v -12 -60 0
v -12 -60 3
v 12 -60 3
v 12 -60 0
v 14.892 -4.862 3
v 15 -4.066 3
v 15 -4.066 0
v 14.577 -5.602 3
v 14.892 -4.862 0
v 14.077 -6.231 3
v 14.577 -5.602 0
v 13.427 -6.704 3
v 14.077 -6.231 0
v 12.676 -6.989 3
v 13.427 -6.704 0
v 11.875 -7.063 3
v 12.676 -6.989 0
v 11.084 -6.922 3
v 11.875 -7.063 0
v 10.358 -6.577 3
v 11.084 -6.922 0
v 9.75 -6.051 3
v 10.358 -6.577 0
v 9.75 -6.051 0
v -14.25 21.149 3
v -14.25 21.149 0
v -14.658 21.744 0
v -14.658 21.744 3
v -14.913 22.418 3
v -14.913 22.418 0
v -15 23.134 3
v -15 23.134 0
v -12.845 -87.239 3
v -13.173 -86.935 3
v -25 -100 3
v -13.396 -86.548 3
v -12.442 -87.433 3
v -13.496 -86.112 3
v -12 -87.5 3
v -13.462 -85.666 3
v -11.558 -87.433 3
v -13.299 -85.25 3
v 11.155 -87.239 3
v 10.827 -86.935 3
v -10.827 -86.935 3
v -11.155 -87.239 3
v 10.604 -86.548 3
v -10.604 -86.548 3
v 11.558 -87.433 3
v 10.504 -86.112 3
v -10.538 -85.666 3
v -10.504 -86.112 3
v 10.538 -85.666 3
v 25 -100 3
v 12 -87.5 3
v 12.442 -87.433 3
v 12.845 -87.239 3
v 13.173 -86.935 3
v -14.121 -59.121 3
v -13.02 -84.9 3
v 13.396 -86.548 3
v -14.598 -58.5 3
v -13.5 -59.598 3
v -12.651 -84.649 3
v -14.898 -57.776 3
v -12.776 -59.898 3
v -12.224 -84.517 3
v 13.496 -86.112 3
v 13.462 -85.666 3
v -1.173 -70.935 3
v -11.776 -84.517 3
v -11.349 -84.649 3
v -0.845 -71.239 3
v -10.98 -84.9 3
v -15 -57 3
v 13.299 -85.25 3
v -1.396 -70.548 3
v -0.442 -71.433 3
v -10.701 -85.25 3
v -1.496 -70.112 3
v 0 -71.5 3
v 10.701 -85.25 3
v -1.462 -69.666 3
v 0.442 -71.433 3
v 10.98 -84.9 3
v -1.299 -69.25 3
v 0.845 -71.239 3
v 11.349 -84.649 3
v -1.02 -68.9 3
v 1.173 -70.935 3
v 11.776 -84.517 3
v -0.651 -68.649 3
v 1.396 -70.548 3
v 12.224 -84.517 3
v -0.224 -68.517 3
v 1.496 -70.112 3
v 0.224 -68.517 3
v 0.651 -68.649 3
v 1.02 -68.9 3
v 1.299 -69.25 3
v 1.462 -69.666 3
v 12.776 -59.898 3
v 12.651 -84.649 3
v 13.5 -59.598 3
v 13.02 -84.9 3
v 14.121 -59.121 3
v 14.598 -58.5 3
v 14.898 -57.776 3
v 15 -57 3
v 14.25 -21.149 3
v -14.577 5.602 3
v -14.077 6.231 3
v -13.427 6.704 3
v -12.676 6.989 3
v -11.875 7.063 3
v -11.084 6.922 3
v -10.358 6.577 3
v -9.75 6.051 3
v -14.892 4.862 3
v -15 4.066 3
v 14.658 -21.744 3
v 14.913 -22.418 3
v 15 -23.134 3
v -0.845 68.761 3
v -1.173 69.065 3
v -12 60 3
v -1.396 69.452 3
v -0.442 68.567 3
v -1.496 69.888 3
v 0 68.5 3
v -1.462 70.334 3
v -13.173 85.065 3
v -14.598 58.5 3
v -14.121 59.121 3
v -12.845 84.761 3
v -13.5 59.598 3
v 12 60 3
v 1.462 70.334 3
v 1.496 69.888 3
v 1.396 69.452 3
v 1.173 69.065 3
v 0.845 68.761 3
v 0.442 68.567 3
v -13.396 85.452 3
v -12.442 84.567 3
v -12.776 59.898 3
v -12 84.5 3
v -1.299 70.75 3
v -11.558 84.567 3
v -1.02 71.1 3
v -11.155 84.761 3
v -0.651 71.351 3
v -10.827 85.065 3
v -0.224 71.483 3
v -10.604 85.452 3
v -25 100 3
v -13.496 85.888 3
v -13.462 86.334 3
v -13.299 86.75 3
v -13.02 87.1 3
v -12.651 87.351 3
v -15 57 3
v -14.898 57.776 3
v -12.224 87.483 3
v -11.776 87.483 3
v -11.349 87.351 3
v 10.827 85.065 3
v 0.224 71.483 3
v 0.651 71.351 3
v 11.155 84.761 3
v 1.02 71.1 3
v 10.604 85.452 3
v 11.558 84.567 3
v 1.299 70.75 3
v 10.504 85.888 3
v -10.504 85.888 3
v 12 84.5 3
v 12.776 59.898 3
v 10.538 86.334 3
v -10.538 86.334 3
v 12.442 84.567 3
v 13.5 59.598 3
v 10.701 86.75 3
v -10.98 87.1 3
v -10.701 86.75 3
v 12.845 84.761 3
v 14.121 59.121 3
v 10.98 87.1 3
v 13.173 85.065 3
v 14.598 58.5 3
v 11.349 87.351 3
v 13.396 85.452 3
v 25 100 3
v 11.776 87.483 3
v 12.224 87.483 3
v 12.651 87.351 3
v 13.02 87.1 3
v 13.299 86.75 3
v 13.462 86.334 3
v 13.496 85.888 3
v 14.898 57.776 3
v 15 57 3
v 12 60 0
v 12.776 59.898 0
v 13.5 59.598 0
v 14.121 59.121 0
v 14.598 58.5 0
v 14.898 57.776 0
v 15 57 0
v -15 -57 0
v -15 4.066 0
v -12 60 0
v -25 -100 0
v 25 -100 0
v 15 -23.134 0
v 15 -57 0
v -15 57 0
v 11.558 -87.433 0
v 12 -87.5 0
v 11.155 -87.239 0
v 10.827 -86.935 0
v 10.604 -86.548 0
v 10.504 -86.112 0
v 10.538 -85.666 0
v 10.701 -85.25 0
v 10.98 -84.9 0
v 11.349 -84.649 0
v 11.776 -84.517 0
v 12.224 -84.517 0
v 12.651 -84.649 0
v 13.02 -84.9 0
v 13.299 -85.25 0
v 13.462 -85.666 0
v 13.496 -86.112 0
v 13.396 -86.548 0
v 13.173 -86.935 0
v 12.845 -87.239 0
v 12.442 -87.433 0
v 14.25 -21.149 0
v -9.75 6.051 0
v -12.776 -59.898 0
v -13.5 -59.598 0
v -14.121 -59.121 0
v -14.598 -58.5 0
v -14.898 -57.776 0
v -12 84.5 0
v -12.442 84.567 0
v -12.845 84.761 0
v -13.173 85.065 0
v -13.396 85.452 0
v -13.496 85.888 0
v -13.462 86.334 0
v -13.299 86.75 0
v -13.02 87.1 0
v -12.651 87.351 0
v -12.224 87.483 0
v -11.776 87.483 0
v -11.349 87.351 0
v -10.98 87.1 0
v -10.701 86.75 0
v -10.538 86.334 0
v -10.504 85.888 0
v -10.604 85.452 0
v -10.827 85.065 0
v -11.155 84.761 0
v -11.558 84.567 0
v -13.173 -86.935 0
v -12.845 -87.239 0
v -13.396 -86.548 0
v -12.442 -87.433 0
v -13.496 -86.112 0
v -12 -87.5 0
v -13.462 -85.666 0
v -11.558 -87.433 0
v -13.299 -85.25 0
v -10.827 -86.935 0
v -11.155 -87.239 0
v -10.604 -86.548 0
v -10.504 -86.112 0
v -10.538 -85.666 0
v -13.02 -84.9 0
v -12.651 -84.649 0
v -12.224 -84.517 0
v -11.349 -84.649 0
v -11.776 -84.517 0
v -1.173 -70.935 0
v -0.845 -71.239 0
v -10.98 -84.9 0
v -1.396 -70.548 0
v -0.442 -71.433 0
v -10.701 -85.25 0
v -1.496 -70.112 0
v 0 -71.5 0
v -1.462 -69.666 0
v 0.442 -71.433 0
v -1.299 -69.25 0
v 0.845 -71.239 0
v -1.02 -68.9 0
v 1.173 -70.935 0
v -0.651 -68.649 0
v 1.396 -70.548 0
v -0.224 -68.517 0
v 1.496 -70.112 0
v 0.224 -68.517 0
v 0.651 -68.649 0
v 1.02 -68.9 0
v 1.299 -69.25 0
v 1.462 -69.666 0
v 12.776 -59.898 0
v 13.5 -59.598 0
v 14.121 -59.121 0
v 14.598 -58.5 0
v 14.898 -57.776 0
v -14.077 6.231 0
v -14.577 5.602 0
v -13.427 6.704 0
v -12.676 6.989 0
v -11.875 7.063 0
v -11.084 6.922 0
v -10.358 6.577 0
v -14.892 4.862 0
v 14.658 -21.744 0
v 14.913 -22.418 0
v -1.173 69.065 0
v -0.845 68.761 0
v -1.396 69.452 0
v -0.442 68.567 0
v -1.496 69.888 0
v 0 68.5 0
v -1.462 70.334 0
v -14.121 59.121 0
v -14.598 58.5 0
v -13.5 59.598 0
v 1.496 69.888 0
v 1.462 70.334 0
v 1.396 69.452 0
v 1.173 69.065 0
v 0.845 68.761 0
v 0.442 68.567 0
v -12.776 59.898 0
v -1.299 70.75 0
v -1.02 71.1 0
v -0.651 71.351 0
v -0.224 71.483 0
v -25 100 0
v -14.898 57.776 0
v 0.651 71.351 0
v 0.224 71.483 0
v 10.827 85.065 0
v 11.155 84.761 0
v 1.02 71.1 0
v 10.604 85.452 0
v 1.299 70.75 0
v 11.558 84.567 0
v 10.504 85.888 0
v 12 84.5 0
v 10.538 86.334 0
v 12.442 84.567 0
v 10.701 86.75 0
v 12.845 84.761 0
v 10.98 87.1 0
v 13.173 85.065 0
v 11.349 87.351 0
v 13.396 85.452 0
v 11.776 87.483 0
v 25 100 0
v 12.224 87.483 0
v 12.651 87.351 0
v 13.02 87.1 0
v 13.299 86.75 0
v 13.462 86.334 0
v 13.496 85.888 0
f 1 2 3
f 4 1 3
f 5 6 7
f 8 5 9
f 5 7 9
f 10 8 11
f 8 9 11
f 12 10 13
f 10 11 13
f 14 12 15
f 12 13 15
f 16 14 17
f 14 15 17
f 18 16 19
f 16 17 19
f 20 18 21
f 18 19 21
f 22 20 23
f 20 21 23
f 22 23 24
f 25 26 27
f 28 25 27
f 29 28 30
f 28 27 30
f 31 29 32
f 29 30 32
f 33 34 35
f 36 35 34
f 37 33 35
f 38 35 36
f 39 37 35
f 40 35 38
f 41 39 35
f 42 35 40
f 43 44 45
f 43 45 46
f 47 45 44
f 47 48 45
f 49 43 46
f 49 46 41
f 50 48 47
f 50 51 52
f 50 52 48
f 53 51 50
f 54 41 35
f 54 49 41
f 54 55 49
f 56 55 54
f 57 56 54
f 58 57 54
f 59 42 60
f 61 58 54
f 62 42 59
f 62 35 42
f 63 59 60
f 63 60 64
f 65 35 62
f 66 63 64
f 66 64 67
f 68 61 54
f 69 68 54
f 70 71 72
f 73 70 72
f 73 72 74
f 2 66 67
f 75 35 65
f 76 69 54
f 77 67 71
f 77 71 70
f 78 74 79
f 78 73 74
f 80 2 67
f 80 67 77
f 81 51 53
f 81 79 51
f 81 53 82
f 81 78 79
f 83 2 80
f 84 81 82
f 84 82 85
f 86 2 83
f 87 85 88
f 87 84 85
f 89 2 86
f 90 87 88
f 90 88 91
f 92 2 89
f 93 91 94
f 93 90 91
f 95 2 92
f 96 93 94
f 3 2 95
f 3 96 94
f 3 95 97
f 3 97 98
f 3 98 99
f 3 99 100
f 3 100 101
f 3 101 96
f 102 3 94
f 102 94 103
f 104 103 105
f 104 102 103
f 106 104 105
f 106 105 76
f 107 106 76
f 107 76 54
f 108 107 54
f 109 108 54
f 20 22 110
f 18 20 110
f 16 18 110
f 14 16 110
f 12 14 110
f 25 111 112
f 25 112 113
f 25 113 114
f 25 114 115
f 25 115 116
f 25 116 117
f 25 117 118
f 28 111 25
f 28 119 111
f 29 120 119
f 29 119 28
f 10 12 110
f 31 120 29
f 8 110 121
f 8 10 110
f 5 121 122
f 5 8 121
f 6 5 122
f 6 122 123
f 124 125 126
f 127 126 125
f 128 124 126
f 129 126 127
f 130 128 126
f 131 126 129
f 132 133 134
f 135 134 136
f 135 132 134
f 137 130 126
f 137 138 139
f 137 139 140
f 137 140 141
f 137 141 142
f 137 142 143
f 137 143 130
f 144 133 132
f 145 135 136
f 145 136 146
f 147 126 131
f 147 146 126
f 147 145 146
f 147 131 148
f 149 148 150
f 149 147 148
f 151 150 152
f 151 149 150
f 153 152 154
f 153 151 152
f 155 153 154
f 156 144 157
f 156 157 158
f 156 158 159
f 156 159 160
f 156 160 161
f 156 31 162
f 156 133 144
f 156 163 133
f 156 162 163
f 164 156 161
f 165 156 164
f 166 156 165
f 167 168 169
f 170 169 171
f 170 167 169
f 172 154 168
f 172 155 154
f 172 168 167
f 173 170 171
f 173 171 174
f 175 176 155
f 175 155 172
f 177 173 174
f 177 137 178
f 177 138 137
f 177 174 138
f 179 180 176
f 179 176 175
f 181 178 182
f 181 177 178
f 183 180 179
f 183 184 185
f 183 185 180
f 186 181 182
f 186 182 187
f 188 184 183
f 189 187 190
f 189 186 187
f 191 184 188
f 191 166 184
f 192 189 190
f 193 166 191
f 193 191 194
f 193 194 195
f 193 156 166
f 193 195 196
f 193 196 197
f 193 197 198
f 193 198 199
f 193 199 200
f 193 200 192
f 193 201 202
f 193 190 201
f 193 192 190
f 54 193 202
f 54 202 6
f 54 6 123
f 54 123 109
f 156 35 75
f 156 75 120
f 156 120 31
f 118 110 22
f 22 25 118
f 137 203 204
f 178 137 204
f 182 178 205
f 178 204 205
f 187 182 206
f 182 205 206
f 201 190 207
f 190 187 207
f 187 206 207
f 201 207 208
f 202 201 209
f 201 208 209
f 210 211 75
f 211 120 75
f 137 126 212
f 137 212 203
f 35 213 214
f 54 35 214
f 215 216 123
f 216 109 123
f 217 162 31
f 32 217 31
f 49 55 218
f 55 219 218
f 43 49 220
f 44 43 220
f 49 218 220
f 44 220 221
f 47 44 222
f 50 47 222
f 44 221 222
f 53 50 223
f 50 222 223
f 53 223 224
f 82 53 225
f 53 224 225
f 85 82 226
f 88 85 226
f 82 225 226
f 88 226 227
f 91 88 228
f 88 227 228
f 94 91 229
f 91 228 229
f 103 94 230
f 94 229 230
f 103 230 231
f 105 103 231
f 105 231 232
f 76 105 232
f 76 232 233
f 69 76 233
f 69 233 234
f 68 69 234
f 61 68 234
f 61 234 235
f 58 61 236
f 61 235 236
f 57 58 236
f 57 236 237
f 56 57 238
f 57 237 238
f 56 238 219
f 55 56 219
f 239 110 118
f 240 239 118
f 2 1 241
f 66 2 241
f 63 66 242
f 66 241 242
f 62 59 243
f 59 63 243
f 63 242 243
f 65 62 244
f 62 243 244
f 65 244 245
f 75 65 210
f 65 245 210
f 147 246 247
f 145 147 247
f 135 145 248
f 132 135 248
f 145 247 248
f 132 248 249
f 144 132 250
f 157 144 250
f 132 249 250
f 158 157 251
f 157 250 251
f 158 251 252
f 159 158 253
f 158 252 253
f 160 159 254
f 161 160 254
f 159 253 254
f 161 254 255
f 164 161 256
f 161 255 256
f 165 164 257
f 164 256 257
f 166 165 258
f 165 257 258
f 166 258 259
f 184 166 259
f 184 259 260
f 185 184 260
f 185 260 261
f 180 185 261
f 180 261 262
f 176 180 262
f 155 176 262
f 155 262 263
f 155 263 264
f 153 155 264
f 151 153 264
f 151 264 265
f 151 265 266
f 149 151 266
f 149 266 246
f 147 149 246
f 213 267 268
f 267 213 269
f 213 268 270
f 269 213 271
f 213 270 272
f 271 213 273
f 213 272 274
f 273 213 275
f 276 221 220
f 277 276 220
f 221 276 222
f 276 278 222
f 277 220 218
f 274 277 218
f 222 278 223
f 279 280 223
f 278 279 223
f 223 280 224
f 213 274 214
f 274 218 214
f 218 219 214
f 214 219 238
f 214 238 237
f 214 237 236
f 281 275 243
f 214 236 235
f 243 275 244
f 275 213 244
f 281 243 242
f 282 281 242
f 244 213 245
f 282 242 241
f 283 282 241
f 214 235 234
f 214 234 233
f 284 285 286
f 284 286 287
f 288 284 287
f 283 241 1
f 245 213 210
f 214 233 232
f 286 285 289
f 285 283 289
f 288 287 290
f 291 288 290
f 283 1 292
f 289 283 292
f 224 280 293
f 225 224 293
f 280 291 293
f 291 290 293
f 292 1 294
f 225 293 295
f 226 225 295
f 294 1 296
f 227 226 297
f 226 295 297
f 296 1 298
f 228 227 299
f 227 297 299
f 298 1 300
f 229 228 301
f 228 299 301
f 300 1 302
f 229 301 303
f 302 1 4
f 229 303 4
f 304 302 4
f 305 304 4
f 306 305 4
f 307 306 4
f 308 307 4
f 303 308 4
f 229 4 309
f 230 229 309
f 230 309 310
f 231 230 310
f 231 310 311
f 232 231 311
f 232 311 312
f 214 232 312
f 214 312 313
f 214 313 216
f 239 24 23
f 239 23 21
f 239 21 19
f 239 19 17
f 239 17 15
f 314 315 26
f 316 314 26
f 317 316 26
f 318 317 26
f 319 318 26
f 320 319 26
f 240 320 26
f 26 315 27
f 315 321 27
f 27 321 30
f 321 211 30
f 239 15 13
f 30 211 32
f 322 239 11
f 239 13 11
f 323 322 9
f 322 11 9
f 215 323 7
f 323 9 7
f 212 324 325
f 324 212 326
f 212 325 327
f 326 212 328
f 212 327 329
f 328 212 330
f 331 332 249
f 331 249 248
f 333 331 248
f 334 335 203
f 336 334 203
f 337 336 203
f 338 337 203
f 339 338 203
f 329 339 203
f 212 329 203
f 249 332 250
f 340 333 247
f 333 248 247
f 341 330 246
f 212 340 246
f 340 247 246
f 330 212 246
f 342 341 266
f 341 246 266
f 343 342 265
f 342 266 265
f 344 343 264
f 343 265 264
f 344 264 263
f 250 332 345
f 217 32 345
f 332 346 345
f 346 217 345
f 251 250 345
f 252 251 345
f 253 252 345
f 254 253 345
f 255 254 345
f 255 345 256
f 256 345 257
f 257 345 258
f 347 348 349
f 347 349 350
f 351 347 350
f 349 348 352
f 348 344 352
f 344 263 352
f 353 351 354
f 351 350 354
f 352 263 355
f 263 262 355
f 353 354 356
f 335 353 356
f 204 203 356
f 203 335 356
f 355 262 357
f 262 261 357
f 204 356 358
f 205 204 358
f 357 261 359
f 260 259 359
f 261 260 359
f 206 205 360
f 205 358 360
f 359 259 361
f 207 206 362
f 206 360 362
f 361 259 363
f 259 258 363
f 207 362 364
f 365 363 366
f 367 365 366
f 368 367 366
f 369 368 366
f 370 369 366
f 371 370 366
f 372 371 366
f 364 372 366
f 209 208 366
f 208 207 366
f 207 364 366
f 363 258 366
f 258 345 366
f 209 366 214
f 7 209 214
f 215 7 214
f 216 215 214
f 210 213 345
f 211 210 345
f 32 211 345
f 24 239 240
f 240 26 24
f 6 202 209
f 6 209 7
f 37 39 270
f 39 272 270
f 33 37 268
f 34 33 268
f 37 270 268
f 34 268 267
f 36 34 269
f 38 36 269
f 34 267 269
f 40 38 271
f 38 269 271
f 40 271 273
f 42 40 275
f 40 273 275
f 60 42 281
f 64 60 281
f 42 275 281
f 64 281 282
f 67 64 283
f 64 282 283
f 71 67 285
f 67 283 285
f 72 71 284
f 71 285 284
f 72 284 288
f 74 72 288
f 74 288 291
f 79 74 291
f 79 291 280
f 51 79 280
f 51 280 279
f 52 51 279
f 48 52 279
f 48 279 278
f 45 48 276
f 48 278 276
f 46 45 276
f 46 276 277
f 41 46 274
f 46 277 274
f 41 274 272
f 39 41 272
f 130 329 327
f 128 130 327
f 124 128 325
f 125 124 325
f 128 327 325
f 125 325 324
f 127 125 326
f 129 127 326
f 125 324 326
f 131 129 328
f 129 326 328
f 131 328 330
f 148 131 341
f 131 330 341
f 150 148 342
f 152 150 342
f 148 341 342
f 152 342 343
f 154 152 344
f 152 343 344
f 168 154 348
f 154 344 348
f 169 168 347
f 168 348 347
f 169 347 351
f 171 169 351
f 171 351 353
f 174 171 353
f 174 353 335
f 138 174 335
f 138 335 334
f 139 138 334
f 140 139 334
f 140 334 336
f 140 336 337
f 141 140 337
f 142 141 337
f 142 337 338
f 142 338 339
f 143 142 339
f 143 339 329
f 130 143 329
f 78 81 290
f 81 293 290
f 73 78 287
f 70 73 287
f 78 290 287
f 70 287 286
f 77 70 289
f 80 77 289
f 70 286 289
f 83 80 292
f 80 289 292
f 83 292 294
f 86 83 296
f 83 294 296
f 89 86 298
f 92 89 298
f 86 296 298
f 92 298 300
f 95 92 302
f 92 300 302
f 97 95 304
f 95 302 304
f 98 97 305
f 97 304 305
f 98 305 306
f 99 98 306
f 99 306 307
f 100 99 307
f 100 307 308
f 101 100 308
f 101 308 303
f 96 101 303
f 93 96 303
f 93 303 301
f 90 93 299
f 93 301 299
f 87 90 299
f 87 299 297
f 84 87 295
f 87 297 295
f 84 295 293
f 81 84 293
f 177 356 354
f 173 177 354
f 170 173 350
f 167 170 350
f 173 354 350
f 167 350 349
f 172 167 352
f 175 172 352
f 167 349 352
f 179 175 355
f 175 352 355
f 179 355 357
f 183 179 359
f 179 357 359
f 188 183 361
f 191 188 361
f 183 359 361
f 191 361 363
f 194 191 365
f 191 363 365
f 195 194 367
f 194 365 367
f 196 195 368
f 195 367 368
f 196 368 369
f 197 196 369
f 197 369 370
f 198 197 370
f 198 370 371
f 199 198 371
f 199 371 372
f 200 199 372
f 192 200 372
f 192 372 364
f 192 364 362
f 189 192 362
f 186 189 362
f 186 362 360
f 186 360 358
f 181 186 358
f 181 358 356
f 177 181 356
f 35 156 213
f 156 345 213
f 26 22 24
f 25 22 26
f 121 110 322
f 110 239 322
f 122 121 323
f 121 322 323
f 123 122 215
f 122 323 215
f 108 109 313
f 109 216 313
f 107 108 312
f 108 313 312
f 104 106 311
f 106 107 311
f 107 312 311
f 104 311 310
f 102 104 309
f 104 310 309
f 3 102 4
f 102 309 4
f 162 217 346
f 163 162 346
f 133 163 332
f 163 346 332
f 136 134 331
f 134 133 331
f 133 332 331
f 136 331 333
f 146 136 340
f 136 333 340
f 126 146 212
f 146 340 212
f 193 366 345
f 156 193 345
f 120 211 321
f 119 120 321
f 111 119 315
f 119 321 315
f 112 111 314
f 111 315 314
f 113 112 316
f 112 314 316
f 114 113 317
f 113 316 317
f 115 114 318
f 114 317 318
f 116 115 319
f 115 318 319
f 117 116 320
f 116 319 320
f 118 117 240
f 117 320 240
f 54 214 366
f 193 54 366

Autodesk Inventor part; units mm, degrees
ref_plane "YZ Plane" through (0, 0, 0) normal (1, 0, 0) x (0, 1, 0)
ref_plane "XZ Plane" through (0, 0, 0) normal (0, 1, 0) x (-1, 0, 0)
ref_plane "XY Plane" through (0, 0, 0) normal (0, 0, 1) x (1, 0, 0)
sketch "Szkic1" plane through (0, 0, 0) normal (0, 0, 1) x (1, 0, 0)
  line L0 (-25, -100) -> (25, -100)
  line L1 (25, -100) -> (25, 100)
  line L2 (25, 100) -> (-25, 100)
  line L3 (-25, 100) -> (-25, -100)
  line L4 (-25, -100) -> (25, 100) construction
  line L5 (25, -100) -> (-25, 100) construction
  point P0 (0, 0)
  dimension "d0" = 50
  dimension "d1" = 200
extrude "Wyciągnięcie proste1" add sketch "Szkic1" along normal blind 3
sketch "Szkic3" plane through (0, 0, 3) normal (0, 0, 1) x (1, 0, 0)
  line L0 (-25, -100) -> (25, -100) projected
  line L1 (25, 100) -> (-25, 100) projected
  line L2 (0, 100) -> (0, -100) construction
  line L3 (-25, 100) -> (-25, -100) projected
  line L4 (-25, 0) -> (25, 0) construction
  point P0 (0, 0)
  point P1 (-12, -86)
  point P2 (12, -86)
  point P3 (0, -70)
  point P4 (-12, 86)
  point P5 (12, 86)
  point P6 (0, 70)
  dimension "d21" = 14
  dimension "d22" = 14
  dimension "d23" = 24
  dimension "d24" = 12
  dimension "d25" = 30
hole "Otwór1" at (-12, -86, 3) at (12, -86, 3) at (0, -70, 3) at (0, 70, 3) at (12, 86, 3) at (-12, 86, 3) direction (0, 0, -1) diameter 3 depth 8 tip angle 118
sketch "Szkic4" plane through (0, 0, 3) normal (0, 0, 1) x (1, 0, 0)
  line L0 (-25, 100) -> (-25, -100) projected
  line L1 (25, -100) -> (25, 100) projected
  line L2 (15, -12) -> (0, 5)
  line L3 (-15, 60) -> (-15, 22)
  line L4 (0, 5) -> (-15, 22)
  line L5 (-15, 60) -> (15, 60)
  line L6 (25, -100) -> (25, 100) projected
  line L7 (15, 60) -> (15, -12)
  line L8 (-15, -60) -> (15, -60)
  line L9 (15, -60) -> (15, -22)
  line L10 (15, -22) -> (-15, 12)
  line L11 (-15, 12) -> (-15, -60)
  point P0 (0, 0)
  dimension "d33" = 10
  dimension "d34" = 10
  dimension "d35" = 60
  dimension "d36" = 60
  dimension "d37" = 5
  dimension "d38" = 25
  dimension "d39" = 10
  dimension "d40" = 12
  dimension "d41" = 10
  dimension "d42" = 10
  dimension "d43" = 10
  dimension "d44" = 10
  dimension "d45" = 60
  dimension "d46" = 60
extrude "Wyciągnięcie proste3" cut sketch "Szkic4" against normal blind 3
fillet "Zaokrąglenie1" radius 3 8 edges at (15, -12, 1.5) (-15, 22, 1.5) (15, 60, 1.5) (-15, 60, 1.5) (-15, 12, 1.5) (15, -22, 1.5) (-15, -60, 1.5) (15, -60, 1.5)
properties part number "Bok" material "Aluminium 6061"
